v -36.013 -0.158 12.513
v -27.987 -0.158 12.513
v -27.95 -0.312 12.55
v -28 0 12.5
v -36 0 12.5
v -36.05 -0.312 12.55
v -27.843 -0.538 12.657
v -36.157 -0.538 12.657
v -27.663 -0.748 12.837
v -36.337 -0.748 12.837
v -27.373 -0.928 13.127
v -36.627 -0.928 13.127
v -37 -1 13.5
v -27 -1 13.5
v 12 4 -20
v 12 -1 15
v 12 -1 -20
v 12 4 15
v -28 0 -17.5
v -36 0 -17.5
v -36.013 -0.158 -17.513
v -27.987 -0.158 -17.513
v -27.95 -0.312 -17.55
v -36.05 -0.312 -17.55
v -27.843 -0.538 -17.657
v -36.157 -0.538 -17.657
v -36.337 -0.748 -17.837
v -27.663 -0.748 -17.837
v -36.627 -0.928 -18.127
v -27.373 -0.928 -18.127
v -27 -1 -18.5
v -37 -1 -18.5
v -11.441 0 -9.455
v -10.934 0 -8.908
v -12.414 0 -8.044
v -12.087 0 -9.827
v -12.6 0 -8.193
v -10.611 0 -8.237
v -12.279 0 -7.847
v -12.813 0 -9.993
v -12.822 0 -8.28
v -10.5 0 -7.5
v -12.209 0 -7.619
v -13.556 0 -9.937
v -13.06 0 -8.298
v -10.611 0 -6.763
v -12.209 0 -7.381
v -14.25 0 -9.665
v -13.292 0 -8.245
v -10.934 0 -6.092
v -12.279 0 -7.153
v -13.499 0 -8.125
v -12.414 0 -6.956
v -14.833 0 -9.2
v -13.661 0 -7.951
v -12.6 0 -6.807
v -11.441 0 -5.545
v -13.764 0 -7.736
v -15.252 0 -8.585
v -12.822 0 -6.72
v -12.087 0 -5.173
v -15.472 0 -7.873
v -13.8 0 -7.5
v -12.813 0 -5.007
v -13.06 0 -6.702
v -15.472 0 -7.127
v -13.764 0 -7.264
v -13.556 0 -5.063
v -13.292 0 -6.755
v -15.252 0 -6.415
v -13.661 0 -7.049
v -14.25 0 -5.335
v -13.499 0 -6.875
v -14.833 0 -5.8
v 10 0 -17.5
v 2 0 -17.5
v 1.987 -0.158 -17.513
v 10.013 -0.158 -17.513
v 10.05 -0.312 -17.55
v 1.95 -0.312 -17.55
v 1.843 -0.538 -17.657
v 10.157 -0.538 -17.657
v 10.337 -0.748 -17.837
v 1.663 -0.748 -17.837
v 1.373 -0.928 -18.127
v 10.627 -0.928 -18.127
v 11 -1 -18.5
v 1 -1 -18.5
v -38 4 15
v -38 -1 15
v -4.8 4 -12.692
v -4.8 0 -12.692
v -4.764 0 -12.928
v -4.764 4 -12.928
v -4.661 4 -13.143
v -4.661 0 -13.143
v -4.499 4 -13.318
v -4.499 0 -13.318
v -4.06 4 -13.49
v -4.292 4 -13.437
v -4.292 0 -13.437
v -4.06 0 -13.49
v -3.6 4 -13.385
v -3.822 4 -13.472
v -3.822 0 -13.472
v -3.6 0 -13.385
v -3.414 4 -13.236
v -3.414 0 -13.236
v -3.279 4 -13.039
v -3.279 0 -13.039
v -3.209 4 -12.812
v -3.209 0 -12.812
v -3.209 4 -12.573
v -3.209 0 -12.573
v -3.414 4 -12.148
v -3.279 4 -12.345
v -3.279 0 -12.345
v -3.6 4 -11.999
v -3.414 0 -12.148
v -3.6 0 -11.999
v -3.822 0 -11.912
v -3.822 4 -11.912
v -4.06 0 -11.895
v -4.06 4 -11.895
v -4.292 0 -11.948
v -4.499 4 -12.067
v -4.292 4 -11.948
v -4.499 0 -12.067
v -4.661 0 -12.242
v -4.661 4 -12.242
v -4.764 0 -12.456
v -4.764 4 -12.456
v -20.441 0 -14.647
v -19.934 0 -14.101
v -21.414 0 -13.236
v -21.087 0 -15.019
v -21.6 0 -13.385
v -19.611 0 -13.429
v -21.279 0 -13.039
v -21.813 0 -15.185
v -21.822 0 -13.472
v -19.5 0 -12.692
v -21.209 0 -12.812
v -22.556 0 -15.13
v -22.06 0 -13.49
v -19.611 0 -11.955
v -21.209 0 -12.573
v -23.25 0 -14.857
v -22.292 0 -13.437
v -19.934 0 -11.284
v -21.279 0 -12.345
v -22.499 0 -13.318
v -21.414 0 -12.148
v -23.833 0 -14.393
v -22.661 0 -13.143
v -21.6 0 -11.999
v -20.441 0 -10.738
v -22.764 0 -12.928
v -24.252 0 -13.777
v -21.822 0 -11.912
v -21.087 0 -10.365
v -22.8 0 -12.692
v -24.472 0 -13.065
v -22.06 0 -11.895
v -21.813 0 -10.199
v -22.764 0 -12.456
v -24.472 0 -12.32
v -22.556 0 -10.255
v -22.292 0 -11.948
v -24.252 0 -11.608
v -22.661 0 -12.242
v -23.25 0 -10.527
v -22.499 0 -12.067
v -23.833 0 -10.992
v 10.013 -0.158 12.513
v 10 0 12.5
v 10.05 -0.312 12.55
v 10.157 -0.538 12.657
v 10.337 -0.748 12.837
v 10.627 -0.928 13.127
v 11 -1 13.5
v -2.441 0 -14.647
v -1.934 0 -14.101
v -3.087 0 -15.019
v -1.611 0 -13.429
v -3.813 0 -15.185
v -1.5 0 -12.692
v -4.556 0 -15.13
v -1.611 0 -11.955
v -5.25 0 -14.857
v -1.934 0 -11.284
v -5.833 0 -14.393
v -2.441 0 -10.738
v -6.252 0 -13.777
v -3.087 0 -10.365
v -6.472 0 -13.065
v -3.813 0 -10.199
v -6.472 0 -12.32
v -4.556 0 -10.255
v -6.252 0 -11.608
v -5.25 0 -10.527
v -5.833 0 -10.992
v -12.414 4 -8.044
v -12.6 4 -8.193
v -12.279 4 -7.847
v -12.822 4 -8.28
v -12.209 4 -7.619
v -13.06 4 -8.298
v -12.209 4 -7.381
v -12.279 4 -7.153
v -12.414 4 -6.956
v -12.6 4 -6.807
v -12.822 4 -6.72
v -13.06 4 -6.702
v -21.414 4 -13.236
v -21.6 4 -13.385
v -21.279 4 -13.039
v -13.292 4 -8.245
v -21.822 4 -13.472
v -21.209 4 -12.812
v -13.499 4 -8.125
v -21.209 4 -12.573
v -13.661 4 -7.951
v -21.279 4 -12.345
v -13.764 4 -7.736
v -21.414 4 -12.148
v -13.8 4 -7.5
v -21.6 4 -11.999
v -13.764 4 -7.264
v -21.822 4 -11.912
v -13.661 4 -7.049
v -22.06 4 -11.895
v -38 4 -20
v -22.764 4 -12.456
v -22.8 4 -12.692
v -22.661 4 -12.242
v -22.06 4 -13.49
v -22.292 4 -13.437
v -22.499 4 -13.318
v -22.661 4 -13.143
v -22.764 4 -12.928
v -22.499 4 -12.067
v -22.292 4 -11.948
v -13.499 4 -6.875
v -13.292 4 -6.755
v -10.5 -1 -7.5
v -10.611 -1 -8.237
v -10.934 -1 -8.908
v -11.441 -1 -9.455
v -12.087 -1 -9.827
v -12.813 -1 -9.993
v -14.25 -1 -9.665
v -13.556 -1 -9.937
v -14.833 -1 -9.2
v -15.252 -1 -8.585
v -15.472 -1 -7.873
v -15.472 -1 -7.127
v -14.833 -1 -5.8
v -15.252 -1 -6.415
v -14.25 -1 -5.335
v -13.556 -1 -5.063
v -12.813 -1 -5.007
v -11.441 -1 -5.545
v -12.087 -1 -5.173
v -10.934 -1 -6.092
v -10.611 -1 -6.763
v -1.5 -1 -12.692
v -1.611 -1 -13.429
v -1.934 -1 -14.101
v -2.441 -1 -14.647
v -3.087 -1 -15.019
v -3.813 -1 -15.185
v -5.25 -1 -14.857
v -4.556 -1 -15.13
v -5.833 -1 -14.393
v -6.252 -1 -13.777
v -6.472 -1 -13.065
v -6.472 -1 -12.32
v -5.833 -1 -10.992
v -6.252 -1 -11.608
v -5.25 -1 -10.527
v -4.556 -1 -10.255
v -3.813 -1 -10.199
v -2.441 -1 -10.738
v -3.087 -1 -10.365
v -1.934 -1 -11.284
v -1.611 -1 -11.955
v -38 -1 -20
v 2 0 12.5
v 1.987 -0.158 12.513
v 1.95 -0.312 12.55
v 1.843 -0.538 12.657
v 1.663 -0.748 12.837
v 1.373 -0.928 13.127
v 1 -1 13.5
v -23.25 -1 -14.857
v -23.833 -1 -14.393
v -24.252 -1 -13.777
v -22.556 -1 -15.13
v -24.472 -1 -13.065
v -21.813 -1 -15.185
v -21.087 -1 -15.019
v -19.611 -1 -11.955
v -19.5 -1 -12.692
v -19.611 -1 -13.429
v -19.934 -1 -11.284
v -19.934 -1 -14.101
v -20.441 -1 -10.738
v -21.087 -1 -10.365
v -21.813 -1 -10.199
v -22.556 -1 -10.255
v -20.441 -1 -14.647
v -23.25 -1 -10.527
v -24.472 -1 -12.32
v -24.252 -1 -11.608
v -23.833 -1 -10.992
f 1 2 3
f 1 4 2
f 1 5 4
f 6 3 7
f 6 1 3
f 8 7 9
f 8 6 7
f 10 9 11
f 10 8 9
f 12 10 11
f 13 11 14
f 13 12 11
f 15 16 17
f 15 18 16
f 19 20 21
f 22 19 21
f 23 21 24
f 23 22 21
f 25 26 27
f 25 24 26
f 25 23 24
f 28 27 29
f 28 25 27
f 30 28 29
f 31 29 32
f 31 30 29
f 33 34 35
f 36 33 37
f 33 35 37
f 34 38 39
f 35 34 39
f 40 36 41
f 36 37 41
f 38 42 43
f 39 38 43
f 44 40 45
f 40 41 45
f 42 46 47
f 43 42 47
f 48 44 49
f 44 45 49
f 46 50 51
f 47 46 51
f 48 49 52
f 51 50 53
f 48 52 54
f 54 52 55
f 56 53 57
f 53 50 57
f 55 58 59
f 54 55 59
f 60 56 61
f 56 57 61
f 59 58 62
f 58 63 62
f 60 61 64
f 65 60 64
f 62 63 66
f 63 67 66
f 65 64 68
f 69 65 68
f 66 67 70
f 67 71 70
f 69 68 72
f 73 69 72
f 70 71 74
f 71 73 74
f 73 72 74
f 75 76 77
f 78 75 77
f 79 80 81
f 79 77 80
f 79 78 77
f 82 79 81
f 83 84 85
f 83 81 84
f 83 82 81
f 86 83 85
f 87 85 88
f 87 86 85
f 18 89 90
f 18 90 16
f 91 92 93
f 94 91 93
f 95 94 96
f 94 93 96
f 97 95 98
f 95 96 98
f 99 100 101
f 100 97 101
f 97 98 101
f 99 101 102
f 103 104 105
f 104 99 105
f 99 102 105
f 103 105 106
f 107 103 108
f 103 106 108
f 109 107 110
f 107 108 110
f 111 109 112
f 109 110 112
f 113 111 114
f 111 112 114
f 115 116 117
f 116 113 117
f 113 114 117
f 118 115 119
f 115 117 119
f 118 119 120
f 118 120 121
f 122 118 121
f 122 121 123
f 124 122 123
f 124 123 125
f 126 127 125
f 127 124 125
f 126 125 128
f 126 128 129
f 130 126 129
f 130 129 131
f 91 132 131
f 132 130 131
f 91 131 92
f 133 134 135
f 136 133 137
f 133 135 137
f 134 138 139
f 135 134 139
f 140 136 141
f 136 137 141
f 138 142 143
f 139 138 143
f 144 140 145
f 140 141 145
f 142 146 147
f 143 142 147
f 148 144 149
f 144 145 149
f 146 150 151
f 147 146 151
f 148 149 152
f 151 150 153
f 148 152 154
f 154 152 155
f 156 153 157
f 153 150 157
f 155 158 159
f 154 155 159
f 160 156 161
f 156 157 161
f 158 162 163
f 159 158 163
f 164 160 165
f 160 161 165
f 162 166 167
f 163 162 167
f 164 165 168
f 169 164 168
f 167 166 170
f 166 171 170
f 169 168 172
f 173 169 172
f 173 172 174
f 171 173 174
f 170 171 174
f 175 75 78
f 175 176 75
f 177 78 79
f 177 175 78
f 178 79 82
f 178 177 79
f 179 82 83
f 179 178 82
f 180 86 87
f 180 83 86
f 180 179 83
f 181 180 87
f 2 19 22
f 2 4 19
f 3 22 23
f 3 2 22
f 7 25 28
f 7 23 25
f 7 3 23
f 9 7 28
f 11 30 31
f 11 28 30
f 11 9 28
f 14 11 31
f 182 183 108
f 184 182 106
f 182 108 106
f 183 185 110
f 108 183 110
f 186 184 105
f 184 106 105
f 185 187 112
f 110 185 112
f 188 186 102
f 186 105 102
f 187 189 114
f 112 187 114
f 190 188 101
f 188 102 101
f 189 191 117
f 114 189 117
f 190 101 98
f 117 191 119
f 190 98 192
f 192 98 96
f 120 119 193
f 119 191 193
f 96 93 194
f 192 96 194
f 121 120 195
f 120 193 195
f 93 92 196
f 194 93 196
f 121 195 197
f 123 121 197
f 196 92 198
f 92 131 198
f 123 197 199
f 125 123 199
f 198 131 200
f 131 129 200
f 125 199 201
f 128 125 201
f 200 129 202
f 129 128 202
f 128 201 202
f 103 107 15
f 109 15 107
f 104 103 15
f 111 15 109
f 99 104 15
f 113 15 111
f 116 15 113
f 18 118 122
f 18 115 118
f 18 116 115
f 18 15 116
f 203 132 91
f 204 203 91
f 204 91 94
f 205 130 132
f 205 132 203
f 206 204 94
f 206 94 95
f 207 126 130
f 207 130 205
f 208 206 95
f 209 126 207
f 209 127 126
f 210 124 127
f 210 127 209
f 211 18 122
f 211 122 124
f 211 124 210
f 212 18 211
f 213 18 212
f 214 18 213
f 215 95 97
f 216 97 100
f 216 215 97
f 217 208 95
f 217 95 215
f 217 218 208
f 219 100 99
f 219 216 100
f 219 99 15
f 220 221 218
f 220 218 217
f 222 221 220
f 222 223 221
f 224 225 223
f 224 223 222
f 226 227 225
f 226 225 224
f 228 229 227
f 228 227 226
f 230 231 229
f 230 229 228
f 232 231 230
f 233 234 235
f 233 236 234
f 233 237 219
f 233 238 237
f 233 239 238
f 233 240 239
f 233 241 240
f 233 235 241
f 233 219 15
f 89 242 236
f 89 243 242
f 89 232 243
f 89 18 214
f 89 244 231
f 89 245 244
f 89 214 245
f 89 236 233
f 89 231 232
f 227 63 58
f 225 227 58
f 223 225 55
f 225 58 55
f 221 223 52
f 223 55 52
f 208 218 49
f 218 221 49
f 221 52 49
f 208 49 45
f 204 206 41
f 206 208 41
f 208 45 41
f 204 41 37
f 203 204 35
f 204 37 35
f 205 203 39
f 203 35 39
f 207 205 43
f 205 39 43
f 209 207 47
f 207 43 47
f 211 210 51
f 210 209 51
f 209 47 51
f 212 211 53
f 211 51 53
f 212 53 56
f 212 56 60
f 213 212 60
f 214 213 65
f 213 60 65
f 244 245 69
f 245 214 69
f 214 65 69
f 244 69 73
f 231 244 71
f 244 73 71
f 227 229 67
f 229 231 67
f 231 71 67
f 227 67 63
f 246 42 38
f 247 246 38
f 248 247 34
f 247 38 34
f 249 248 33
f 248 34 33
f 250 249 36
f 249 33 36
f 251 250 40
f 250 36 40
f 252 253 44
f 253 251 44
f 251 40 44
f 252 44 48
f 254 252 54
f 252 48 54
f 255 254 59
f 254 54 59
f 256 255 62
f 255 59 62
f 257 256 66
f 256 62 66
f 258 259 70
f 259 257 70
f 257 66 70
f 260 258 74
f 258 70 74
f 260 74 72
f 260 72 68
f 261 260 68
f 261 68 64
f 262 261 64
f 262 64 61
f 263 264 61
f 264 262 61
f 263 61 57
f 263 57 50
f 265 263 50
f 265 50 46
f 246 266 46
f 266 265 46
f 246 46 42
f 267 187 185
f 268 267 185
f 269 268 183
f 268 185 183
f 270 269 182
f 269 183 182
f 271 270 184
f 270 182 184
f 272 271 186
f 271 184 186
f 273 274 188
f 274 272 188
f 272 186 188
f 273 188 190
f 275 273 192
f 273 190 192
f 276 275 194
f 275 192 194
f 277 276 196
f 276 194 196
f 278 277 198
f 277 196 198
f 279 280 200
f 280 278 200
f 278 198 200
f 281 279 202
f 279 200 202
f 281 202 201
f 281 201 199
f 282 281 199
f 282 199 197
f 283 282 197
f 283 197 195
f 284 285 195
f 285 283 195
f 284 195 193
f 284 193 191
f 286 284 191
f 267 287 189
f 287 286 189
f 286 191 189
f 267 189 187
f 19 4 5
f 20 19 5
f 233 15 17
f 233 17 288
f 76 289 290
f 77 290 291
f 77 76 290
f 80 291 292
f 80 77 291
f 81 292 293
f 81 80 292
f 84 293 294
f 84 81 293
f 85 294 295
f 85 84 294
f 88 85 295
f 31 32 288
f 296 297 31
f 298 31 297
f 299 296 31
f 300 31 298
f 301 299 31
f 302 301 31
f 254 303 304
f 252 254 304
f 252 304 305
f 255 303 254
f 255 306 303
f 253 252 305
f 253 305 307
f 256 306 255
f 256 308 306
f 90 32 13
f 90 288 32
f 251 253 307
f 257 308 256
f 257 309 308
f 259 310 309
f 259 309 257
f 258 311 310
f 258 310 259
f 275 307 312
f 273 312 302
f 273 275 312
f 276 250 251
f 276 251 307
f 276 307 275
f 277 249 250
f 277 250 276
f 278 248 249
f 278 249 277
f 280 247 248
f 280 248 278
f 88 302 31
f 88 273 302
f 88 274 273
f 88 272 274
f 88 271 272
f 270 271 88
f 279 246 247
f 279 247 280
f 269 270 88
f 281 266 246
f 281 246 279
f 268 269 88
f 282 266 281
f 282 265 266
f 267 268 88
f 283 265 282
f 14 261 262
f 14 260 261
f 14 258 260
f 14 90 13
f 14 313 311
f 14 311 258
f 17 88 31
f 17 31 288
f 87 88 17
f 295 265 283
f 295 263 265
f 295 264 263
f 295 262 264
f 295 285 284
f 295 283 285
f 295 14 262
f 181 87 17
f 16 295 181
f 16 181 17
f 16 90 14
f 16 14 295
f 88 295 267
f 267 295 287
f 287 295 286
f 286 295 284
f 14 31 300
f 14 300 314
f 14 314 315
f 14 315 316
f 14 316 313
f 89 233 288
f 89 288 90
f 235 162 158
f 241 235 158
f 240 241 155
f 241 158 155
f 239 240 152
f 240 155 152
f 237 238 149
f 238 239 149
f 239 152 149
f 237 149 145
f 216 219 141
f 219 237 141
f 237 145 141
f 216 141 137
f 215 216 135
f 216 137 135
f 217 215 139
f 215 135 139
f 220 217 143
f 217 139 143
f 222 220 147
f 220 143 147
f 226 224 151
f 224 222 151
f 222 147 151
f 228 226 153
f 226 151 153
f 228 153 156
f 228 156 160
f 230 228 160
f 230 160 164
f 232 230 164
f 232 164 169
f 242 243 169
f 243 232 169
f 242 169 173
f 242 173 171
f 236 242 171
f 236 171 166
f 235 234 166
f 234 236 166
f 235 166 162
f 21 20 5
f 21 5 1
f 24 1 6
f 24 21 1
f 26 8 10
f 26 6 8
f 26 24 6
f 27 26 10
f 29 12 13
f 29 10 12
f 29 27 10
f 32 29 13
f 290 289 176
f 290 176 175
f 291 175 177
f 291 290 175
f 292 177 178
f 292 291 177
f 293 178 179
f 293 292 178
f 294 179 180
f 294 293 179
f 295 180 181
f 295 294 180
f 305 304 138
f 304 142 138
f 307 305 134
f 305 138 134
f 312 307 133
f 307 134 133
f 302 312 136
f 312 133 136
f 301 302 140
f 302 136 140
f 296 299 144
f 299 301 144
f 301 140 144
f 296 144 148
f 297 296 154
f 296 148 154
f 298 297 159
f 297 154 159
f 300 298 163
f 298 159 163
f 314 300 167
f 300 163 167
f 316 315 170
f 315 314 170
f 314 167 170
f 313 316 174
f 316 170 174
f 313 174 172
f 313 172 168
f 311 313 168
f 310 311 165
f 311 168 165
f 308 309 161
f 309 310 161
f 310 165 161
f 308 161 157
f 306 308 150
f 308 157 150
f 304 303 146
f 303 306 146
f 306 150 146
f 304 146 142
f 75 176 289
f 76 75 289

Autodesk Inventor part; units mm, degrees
ref_plane "YZ Plane" through (0, 0, 0) normal (1, 0, 0) x (0, 1, 0)
ref_plane "XZ Plane" through (0, 0, 0) normal (0, 1, 0) x (-1, 0, 0)
ref_plane "XY Plane" through (0, 0, 0) normal (0, 0, 1) x (1, 0, 0)
sketch "スケッチ1" plane through (0, 0, 0) normal (0, 1, 0) x (-1, 0, 0)
  line L0 (26, 0) -> (0, 0)
  line L1 (0, 0) -> (0, -15)
  line L2 (0, -15) -> (26, -15)
  line L3 (26, -15) -> (26, 0)
  line L4 (36.4849, 5.9511) -> (26, -20)
  line L5 (26, -20) -> (0, -20)
  line L6 (0, -20) -> (-10.4849, 5.9511)
  arc A0 (36.4849, 5.9511) -> (-10.4849, 5.9511) centre (13, -20) ccw
  line L7 (0, 0) -> (26, -15)
  line L8 (0, -15) -> (26, 0)
  line L9 (4, -2.3077) -> (22, -2.3077)
  line L10 (22, -2.3077) -> (22, -12.6923)
  line L11 (22, -12.6923) -> (4, -12.6923)
  line L12 (4, -12.6923) -> (4, -2.3077)
  circle A1 centre (4, -2.3077) radius 0.8
  circle A2 centre (4, -12.6923) radius 0.8
  circle A3 centre (22, -2.3077) radius 0.8
  circle A4 centre (22, -12.6923) radius 0.8
  circle A5 centre (13, -7.5) radius 0.8
  line L13 (38, 15) -> (-12, 15)
  line L14 (-12, 15) -> (-12, -20)
  line L15 (-12, -20) -> (38, -20)
  line L16 (38, -20) -> (38, 15)
  point P0 (22.6929, -13.0921)
  point P1 (21.2, -12.6923)
  point P2 (13, 15)
  point P3 (13, -7.5)
  point P4 (13, 15)
  point P5 (0, -20)
  dimension "d0" = 26
  dimension "d1" = 15
  dimension "d4" = 22
  dimension "d5" = 22
  dimension "d6" = 5
  dimension "d7" = 35
  dimension "d23" = 4
  dimension "d24" = 1.6
  dimension "d25" = 1.6
  dimension "d26" = 1.6
  dimension "d27" = 1.6
  dimension "d32" = 1.6
  dimension "d54" = 50
  dimension "d55" = 35
extrude "押し出し1" add sketch "スケッチ1" along normal blind 4 contours L8 A3 L9 A1 L7 L0 | L3 L7 A4 L10 A3 L8 | L7 A1 L12 A2 L8 L1 | L2 L8 A2 L11 A4 L7 | A3 L10 L8 | L8 L9 A3 | A1 L9 L7 | L7 L12 A1 | L10 A3 L8 | L8 A3 L9 | A3 L8 A5 L7 A1 L9 | L9 A1 L7 | L7 A1 L12 | A1 L7 A5 L8 A2 L12 | L11 A2 L8 A5 L7 A4 | A3 L10 A4 L7 A5 L8 | A0 L13 L16 L15 L4 | L4 L5 L6 A0 | A0 L6 L15 L14 L13
sketch "スケッチ5" plane through (0, 0, 0) normal (0, -1, 0) x (1, 0, 0)
  line L0 (12, -20) -> (-38, -20) projected
  line L1 (12, 15) -> (12, -20) projected
  line L2 (-38, 15) -> (12, 15) projected
  line L3 (-38, -20) -> (-38, 15) projected
  circle A0 centre (-13, -7.5) radius 0.8 projected
  circle A1 centre (-4, -12.6923) radius 0.8 projected
  circle A2 centre (-22, -12.6923) radius 0.8 projected
  circle A3 centre (-13, -7.5) radius 2.5
  circle A4 centre (-4, -12.6923) radius 2.5
  circle A5 centre (-22, -12.6923) radius 2.5
  line L4 (10, 12.5) -> (2, 12.5)
  line L5 (2, 12.5) -> (2, -17.5)
  line L6 (2, -17.5) -> (10, -17.5)
  line L7 (10, -17.5) -> (10, 12.5)
  line L8 (-28, 12.5) -> (-36, 12.5)
  line L9 (-36, 12.5) -> (-36, -17.5)
  line L10 (-36, -17.5) -> (-28, -17.5)
  line L11 (-28, -17.5) -> (-28, 12.5)
  point P0 (0, 0)
  point P1 (10, -2.5)
  point P2 (12, -2.5)
  point P3 (-28, -2.5)
  dimension "d56" = 5
  dimension "d57" = 5
  dimension "d58" = 5
  dimension "d61" = 8
  dimension "d62" = 30
  dimension "d63" = 2
  dimension "d64" = 2
extrude "押し出し5" add sketch "スケッチ5" along normal blind 1 contours L0 L3 L2 L1
fillet "フィレット3" radius 1 8 edges at (6, -1, 12.5) (10, -1, -2.5) (6, -1, -17.5) (2, -1, -2.5) (-28, -1, -2.5) (-32, -1, -17.5) (-36, -1, -2.5) (-32, -1, 12.5)
equation "\"d5\" = d4"
equation "\"BendRadius\" = Thickness"
equation "\"BendReliefWidth\" = Thickness"
equation "\"BendReliefDepth\" = 0.5 * Thickness"
equation "\"CornerReliefSize\" = 4 * Thickness"
equation "\"MinimumRemnant\" = 2 * Thickness"
equation "\"TransitionRadius\" = BendRadius"
equation "\"JacobiRadiusSize\" = BendRadius"
equation "\"GapSize\" = Thickness"
equation "\"Thickness\" = 3.048"
properties part number "toe_sole_front"
